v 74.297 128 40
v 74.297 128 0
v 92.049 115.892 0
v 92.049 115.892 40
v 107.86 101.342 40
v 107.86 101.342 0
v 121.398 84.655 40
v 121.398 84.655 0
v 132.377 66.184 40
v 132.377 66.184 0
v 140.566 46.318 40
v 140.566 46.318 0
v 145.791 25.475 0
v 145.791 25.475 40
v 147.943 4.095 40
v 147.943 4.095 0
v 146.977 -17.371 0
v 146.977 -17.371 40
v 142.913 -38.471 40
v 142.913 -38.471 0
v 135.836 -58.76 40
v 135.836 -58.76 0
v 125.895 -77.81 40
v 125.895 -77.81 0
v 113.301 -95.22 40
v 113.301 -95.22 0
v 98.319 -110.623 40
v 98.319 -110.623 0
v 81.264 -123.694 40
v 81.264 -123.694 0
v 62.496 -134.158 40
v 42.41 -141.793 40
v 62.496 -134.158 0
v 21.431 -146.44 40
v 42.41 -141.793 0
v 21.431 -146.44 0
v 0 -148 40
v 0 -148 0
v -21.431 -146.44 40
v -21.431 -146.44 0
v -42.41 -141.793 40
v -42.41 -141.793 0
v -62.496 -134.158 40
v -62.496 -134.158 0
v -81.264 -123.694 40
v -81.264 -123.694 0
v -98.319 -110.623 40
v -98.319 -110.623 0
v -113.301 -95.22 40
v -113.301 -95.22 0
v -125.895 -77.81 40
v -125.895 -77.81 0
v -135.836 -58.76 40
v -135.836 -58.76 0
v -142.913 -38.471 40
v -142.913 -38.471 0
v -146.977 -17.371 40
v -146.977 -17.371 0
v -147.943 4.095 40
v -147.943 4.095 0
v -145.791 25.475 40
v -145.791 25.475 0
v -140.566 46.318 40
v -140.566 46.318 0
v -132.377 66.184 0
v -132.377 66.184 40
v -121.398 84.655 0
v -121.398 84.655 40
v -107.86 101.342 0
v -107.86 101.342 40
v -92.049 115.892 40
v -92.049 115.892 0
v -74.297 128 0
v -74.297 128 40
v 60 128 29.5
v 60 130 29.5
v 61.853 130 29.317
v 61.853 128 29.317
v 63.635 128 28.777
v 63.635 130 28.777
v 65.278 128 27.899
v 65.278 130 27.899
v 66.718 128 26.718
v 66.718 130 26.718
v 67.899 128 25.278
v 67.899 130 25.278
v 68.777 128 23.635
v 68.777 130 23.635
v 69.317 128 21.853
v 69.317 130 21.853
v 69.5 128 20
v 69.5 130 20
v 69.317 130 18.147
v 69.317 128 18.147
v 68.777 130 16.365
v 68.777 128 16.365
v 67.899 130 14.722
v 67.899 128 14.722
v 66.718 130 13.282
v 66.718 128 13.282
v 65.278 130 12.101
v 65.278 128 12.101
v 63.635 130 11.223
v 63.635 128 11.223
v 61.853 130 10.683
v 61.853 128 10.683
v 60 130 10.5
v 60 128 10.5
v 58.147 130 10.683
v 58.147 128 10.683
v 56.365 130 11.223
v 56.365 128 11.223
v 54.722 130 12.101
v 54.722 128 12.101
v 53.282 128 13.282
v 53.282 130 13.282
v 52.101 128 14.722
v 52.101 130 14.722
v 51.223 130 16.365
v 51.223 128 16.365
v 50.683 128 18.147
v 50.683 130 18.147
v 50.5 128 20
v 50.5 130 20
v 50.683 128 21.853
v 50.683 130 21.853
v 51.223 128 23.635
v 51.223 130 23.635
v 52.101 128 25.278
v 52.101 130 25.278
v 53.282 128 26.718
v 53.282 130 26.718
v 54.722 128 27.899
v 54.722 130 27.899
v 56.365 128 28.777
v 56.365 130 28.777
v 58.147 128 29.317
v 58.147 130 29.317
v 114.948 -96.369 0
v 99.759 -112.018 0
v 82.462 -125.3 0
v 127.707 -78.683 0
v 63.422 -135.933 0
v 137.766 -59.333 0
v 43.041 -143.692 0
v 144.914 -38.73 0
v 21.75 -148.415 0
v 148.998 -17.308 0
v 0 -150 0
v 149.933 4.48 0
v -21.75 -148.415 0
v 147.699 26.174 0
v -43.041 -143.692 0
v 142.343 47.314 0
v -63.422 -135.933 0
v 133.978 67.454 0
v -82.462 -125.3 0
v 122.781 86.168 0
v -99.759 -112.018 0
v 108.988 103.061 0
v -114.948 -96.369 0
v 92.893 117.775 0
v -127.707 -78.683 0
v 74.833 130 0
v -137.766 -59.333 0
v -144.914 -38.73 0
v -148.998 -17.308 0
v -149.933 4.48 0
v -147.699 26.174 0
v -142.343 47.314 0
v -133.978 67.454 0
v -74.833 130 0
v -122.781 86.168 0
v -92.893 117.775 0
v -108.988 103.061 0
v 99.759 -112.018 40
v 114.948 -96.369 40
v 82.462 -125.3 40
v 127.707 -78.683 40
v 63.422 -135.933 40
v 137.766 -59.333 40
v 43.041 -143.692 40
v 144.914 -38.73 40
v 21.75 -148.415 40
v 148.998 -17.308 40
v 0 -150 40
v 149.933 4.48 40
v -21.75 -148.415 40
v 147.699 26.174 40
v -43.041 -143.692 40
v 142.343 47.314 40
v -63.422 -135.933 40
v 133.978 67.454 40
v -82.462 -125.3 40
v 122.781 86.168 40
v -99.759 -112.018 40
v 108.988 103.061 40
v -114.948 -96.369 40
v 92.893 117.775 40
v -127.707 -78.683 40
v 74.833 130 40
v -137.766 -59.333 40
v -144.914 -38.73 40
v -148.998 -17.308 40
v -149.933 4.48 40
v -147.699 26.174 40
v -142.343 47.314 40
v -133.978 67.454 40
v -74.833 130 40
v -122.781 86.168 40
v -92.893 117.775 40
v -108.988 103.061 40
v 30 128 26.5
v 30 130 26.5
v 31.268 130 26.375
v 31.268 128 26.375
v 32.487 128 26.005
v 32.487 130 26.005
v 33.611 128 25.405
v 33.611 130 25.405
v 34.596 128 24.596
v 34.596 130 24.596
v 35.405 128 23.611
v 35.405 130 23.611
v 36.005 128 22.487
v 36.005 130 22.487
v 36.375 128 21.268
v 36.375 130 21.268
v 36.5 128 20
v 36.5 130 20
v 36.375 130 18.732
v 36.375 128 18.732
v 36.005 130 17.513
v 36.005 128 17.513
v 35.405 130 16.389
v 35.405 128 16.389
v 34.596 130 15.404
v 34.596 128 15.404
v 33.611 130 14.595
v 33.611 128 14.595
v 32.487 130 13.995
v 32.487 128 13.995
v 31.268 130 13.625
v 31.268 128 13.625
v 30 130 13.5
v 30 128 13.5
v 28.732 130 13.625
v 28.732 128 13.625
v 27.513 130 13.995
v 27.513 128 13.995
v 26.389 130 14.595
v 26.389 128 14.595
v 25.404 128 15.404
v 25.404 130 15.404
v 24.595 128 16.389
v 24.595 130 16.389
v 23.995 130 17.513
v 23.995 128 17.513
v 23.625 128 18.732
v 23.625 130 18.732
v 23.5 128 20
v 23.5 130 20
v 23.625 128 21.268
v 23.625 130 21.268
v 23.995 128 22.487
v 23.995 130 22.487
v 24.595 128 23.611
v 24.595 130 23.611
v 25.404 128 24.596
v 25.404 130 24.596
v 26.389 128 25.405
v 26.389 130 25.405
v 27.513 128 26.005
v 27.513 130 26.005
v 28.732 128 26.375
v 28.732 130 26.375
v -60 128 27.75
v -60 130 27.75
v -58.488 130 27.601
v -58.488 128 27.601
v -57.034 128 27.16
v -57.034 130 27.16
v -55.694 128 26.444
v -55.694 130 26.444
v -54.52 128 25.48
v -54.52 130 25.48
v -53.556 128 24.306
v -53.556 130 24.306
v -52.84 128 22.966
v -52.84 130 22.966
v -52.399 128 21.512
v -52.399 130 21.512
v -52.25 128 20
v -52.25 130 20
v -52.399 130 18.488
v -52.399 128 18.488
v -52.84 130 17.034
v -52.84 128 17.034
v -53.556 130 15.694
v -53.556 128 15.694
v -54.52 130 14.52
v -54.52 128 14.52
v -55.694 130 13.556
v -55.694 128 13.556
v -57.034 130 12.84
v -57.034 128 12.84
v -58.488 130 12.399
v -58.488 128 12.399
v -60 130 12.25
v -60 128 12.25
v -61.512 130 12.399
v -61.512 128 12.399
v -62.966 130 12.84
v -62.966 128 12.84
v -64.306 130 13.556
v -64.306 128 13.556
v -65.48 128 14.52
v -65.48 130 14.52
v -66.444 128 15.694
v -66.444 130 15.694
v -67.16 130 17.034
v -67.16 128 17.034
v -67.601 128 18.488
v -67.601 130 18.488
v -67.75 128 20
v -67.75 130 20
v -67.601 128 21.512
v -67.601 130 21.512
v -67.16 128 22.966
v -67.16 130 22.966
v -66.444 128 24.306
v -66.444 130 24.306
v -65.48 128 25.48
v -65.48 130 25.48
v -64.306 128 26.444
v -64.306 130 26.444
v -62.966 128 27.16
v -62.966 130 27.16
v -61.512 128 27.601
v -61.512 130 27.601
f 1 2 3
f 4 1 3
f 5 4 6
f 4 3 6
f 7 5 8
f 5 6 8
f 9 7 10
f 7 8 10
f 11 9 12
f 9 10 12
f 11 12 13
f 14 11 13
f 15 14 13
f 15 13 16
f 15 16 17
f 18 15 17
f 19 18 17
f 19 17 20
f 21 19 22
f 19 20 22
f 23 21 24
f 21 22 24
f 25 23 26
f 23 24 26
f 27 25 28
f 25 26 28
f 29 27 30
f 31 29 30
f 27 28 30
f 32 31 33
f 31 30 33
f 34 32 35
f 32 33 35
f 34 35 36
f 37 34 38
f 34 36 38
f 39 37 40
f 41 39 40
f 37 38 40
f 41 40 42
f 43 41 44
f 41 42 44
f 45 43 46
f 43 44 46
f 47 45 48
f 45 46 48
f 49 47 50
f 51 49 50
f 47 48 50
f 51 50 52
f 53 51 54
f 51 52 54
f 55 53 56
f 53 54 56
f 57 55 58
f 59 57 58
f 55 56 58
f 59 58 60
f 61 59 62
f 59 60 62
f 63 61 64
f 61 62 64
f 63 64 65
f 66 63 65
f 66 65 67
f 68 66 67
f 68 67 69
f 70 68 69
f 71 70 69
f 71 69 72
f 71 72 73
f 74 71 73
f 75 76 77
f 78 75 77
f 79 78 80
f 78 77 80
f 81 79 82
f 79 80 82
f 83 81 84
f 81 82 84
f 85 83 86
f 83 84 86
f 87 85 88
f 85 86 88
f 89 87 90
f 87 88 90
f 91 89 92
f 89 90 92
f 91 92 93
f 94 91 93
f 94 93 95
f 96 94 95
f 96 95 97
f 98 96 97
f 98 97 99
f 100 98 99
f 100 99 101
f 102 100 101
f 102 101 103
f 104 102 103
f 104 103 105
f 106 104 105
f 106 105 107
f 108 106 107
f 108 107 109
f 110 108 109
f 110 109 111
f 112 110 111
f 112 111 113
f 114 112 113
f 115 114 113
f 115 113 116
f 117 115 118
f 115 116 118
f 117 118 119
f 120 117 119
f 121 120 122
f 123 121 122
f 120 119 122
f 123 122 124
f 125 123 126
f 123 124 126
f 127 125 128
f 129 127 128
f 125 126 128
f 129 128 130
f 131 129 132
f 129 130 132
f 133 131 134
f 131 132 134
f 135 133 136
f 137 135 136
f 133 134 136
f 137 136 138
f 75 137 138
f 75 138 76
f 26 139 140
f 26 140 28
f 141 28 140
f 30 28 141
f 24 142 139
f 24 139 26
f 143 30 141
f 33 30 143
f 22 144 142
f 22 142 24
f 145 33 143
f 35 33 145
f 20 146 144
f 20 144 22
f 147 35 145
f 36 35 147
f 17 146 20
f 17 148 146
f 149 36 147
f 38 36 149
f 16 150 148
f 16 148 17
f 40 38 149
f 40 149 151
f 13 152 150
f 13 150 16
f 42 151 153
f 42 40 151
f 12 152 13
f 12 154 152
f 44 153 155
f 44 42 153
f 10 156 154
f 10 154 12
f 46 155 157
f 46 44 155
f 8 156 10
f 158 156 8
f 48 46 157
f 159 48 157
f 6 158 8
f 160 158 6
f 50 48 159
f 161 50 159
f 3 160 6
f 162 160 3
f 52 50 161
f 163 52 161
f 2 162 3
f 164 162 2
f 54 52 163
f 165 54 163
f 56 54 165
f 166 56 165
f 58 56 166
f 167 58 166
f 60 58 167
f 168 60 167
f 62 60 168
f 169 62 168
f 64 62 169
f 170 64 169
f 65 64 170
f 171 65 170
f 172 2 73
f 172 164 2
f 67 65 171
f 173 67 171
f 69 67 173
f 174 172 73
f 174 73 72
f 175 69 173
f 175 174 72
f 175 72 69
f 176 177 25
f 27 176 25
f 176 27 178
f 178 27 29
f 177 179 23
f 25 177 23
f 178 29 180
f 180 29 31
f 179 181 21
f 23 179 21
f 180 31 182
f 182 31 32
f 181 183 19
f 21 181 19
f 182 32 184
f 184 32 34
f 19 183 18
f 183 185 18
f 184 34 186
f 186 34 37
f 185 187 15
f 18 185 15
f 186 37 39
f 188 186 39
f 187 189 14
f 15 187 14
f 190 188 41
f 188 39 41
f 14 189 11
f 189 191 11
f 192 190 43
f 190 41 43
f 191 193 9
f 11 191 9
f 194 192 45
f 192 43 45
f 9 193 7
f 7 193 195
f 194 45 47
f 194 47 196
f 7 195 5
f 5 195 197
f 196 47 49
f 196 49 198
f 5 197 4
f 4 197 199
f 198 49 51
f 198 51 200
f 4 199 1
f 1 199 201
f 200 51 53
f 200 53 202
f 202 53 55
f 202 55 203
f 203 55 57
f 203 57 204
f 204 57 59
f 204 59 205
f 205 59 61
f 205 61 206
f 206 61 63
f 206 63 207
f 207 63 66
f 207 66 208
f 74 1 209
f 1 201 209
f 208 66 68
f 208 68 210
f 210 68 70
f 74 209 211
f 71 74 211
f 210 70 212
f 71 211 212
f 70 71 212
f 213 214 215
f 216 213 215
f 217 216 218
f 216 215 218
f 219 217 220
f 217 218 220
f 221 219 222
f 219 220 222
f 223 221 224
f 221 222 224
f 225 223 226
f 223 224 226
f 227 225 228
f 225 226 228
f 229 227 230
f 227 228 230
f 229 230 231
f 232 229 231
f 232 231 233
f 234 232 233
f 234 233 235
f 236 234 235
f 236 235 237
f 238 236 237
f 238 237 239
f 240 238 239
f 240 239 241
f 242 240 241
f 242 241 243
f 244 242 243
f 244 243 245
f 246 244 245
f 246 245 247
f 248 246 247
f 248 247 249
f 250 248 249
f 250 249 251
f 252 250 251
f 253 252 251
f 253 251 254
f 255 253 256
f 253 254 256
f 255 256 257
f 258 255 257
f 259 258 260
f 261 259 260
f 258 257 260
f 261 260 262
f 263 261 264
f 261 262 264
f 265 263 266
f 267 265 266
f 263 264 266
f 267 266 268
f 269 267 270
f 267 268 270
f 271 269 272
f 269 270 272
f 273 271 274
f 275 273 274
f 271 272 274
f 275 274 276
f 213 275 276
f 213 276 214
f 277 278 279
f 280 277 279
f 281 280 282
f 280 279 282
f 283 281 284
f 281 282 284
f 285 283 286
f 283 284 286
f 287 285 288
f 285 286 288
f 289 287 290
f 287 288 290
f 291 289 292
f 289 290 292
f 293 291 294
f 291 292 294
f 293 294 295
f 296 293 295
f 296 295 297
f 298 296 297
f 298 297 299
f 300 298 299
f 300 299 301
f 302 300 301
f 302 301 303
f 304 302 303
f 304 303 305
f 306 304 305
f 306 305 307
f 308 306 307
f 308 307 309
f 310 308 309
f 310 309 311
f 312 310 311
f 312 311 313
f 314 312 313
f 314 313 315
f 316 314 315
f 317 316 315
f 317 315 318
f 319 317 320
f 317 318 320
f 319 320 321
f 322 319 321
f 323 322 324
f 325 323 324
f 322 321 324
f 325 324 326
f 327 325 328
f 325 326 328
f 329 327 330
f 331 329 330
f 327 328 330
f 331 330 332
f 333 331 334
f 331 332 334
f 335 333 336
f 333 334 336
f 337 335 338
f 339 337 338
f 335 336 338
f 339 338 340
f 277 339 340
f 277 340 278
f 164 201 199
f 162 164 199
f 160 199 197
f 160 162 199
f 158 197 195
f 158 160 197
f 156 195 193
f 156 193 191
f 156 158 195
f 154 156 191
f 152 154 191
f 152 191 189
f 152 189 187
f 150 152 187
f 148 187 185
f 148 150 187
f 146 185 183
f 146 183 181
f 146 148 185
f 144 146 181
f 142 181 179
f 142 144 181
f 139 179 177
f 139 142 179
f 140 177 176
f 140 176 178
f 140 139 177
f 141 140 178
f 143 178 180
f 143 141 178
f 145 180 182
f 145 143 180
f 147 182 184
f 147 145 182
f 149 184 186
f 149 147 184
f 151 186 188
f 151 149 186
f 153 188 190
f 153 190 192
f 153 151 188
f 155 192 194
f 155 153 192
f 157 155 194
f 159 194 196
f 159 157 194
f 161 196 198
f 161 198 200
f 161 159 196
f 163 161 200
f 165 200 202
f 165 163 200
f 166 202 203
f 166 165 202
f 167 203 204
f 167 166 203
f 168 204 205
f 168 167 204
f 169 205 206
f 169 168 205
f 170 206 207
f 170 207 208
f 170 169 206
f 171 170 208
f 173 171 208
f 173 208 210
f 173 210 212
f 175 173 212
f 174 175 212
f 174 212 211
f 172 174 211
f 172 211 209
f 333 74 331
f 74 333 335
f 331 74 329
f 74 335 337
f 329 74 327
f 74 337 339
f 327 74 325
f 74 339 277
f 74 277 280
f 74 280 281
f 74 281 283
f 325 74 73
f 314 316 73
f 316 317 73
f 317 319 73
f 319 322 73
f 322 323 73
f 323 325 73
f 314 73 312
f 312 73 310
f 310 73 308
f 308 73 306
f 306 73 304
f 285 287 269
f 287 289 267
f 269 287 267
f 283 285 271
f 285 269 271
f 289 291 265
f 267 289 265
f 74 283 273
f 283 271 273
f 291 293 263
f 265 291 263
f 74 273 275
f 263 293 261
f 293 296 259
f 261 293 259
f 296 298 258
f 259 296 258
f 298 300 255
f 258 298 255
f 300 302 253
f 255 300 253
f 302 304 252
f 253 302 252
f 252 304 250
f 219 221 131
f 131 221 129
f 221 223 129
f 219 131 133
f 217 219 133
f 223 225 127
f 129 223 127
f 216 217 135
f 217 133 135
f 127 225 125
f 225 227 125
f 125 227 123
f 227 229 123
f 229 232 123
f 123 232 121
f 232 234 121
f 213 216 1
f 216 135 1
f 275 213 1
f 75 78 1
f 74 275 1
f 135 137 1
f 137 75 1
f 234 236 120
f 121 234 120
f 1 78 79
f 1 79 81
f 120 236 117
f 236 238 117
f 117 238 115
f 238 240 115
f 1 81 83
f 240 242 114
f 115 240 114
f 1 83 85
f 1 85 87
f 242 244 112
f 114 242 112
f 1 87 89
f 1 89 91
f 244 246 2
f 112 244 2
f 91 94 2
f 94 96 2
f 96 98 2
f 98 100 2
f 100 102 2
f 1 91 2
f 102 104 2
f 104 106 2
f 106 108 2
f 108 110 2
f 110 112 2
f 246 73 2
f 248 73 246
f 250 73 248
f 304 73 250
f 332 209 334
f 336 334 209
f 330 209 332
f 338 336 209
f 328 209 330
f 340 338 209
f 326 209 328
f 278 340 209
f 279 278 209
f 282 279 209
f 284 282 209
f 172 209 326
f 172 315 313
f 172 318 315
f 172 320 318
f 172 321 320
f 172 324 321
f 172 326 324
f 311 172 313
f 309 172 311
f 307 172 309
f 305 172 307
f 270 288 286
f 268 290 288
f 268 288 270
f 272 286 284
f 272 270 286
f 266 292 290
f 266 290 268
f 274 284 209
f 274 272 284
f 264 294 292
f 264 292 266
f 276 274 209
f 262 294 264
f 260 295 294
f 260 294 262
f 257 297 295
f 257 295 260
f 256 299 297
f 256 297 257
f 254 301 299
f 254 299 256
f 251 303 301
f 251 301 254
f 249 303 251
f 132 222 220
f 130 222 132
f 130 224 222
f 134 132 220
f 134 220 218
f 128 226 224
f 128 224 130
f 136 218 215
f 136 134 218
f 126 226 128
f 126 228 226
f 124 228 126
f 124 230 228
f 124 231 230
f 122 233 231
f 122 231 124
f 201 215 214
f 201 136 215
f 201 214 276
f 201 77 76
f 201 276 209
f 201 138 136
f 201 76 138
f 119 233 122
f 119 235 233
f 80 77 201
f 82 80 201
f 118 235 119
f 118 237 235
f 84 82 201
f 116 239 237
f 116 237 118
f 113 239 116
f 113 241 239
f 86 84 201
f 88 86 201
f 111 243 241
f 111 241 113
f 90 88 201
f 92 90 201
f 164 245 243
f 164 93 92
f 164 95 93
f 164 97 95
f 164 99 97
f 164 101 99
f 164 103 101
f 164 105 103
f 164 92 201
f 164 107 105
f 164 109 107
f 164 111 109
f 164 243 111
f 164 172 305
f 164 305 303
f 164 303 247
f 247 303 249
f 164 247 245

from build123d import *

# Parameters (mm, degrees)
BOSS_EXTRU_1_DEPTH      = 40
ENL_V_MAT_EXTRU_1_REACH = 322.156
ESQUISSE2_R             = 9.5
ESQUISSE2_R_2           = 7.75
ESQUISSE2_R_3           = 6.5


with BuildPart() as part:
    # Esquisse1 → Boss.-Extru.1 (new body)
    with BuildSketch(Plane.XY):
        with BuildLine():
            Line((-74.833147735, 130), (74.833147735, 130))
            ThreePointArc((74.833147735, 130), (0, -150), (-74.833147735, 130))
        make_face()
        with BuildLine():
            Line((-74.296702484, 128), (74.296702484, 128))
            ThreePointArc((74.296702484, 128), (0, -148), (-74.296702484, 128))
        make_face(mode=Mode.SUBTRACT)
    extrude(amount=BOSS_EXTRU_1_DEPTH)

    # Esquisse2 → Enlèv. mat.-Extru.1 (cut, up to next)
    with BuildSketch(Plane(origin=(0, 130, 0), x_dir=(1, 0, 0), z_dir=(0, 1, 0)), mode=Mode.PRIVATE) as enl_v_mat_extru_1_sk1:
        with Locations(Location((60, -20, 0), (0, 0, 270))):
            Circle(ESQUISSE2_R)
    enl_v_mat_extru_1_tool1 = extrude(enl_v_mat_extru_1_sk1.sketch, amount=-ENL_V_MAT_EXTRU_1_REACH, mode=Mode.PRIVATE) & part.part
    # Esquisse2 → Enlèv. mat.-Extru.1 (cut, up to next)
    with BuildSketch(Plane(origin=(0, 130, 0), x_dir=(1, 0, 0), z_dir=(0, 1, 0)), mode=Mode.PRIVATE) as enl_v_mat_extru_1_sk2:
        with Locations(Location((-60, -20, 0), (0, 0, 270))):
            Circle(ESQUISSE2_R_2)
    enl_v_mat_extru_1_tool2 = extrude(enl_v_mat_extru_1_sk2.sketch, amount=-ENL_V_MAT_EXTRU_1_REACH, mode=Mode.PRIVATE) & part.part
    # Esquisse2 → Enlèv. mat.-Extru.1 (cut, up to next)
    with BuildSketch(Plane(origin=(0, 130, 0), x_dir=(1, 0, 0), z_dir=(0, 1, 0)), mode=Mode.PRIVATE) as enl_v_mat_extru_1_sk3:
        with Locations(Location((30, -20, 0), (0, 0, 270))):
            Circle(ESQUISSE2_R_3)
    enl_v_mat_extru_1_tool3 = extrude(enl_v_mat_extru_1_sk3.sketch, amount=-ENL_V_MAT_EXTRU_1_REACH, mode=Mode.PRIVATE) & part.part
    add(enl_v_mat_extru_1_tool1.solids().sort_by_distance((60, 130, 20))[0], mode=Mode.SUBTRACT)
    add(enl_v_mat_extru_1_tool2.solids().sort_by_distance((-60, 130, 20))[0], mode=Mode.SUBTRACT)
    add(enl_v_mat_extru_1_tool3.solids().sort_by_distance((30, 130, 20))[0], mode=Mode.SUBTRACT)


solid = part.part
